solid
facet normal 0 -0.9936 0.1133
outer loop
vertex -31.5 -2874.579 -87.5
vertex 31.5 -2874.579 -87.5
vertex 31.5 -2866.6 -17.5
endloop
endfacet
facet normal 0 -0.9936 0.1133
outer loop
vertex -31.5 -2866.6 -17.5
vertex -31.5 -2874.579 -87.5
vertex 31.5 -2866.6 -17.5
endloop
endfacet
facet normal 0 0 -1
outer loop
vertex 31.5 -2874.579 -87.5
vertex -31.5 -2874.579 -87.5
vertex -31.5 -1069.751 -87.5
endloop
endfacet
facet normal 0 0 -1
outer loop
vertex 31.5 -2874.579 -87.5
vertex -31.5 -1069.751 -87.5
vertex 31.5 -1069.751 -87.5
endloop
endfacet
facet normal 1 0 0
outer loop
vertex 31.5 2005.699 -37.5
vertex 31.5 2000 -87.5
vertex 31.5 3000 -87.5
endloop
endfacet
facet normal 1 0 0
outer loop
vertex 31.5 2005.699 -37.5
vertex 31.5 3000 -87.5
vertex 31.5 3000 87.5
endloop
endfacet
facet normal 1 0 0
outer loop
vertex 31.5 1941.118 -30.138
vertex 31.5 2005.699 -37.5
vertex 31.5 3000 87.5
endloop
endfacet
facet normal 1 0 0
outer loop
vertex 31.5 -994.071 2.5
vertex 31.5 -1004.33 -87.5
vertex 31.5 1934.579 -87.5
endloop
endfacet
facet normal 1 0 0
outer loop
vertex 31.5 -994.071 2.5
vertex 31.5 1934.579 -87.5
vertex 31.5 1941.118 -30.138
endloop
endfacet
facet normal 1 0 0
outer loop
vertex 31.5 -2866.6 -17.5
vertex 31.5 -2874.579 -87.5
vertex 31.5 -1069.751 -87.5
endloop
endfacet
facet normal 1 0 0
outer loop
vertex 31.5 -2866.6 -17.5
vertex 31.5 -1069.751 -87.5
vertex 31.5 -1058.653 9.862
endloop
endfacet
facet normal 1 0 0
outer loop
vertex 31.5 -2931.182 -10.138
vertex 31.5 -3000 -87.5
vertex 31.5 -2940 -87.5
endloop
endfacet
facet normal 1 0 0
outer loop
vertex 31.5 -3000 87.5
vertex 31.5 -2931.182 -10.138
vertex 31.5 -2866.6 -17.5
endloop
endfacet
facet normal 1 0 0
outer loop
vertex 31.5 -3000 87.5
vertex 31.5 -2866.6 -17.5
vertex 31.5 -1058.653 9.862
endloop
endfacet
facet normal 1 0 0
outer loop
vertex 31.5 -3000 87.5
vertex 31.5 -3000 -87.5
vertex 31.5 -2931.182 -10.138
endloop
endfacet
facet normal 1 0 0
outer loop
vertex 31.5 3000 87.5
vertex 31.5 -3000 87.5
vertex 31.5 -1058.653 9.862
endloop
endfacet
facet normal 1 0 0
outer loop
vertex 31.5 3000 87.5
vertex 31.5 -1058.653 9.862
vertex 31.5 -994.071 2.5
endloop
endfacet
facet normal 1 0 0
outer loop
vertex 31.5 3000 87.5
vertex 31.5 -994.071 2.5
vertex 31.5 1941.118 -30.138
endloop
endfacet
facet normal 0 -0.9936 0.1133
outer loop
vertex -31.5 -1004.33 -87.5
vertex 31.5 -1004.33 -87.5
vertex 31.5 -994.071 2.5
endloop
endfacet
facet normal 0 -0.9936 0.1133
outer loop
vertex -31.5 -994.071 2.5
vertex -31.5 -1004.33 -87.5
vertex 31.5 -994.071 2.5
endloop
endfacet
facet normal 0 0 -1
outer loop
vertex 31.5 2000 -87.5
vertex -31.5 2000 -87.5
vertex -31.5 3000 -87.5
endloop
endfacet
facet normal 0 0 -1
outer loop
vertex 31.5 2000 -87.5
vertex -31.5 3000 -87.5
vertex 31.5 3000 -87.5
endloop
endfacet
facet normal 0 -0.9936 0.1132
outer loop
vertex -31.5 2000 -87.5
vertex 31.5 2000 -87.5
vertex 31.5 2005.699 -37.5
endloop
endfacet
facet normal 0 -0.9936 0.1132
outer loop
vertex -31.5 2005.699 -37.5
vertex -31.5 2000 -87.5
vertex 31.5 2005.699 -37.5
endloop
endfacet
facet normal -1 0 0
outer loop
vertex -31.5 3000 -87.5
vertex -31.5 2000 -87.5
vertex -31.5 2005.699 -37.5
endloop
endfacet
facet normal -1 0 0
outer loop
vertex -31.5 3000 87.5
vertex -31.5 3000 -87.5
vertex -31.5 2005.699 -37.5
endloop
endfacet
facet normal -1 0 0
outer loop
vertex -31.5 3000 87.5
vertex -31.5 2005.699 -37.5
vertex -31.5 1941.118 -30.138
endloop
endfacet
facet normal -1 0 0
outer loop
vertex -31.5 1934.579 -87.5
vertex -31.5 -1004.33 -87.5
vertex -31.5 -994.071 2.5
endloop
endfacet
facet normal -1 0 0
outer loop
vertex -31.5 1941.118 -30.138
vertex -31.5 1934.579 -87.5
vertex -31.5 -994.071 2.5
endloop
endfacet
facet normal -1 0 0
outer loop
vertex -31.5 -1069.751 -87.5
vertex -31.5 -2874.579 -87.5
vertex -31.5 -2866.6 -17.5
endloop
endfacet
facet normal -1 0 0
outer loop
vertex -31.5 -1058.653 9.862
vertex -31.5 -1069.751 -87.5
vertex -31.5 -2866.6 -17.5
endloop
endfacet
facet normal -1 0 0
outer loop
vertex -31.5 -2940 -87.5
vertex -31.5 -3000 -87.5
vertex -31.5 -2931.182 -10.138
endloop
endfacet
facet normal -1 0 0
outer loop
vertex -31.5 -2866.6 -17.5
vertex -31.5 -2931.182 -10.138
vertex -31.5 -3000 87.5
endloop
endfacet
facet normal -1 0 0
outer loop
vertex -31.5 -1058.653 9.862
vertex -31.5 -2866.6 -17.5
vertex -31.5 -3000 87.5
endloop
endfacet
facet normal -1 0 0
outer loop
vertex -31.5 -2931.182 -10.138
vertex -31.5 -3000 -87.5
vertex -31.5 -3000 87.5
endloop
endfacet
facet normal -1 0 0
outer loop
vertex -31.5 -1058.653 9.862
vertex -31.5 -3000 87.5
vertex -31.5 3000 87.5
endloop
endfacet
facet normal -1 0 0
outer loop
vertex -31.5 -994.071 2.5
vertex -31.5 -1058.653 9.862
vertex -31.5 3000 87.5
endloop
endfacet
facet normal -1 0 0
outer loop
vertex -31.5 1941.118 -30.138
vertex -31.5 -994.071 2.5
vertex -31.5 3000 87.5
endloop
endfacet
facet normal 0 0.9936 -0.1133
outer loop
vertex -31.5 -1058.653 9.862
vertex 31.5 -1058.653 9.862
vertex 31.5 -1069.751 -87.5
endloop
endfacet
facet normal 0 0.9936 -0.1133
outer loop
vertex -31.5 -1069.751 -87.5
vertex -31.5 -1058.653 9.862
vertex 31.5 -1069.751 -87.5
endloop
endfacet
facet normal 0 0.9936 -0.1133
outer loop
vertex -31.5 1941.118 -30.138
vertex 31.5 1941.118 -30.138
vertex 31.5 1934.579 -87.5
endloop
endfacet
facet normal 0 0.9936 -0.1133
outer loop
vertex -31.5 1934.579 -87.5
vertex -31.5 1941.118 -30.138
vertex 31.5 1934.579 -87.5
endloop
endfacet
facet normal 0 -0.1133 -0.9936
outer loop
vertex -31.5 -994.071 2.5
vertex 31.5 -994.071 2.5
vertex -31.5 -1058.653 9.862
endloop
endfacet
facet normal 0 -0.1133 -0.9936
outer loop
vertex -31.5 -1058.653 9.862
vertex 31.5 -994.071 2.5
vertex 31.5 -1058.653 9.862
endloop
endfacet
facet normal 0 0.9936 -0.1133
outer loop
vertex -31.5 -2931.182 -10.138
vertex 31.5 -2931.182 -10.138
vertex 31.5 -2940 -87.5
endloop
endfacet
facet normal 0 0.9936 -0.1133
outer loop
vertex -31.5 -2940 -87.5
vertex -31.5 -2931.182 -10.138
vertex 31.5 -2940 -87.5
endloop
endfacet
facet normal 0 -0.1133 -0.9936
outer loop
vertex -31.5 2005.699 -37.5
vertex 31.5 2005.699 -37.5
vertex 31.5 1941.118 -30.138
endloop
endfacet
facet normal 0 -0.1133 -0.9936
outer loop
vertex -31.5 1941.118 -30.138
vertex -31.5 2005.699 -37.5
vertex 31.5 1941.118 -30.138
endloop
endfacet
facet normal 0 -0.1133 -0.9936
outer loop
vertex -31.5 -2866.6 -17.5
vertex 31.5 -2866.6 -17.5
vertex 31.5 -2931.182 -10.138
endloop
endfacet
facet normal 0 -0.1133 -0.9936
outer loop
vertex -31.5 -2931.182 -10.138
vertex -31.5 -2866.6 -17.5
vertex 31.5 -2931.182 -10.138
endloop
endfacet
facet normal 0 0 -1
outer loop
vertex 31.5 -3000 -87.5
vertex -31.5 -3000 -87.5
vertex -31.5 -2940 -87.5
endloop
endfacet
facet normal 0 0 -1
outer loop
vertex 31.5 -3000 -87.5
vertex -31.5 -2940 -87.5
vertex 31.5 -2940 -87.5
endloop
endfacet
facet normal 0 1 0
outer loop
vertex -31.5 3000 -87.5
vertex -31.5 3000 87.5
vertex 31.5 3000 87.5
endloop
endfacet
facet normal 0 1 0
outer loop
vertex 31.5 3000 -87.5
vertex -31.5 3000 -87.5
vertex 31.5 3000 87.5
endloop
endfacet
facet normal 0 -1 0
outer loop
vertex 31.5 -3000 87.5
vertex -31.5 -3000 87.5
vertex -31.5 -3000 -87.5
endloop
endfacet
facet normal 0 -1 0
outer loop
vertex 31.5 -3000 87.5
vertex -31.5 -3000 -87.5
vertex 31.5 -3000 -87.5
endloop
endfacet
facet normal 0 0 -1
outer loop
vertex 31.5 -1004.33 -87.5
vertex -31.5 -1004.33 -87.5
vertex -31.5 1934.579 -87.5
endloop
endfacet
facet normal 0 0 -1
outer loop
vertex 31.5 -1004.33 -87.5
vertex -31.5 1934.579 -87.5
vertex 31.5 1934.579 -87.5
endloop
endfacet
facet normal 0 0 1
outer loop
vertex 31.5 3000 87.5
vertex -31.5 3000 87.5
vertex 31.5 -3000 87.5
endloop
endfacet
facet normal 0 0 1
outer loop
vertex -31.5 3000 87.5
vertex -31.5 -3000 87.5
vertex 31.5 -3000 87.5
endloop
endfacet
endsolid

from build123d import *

# Parameters (mm, degrees)
F0_W     = 63
F0_H     = 175
F1_DEPTH = 3000
F3_DEPTH = 63


with BuildPart() as f1:
    # F0 (on Front) → F1 (new body, symmetric)
    with BuildSketch(Plane.XZ):
        Rectangle(F0_W, F0_H)
    extrude(amount=F1_DEPTH, both=True)

    # F2 (on face) → F3 (cut, through all)
    with BuildSketch(Plane.YZ.offset(31.5)):
        Polygon((1934.57907, -87.5), (2000, -87.5), (2005.699481, -37.5), (1941.117703, -30.138347), align=None)
        Polygon((-1069.75134, -87.5), (-1004.33041, -87.5), (-994.071343, 2.5), (-1058.653121, 9.861653), align=None)
        Polygon((-2940, -87.5), (-2874.57907, -87.5), (-2866.599796, -17.5), (-2931.181574, -10.138347), align=None)
    extrude(amount=-F3_DEPTH, mode=Mode.SUBTRACT)


solid = f1.part
